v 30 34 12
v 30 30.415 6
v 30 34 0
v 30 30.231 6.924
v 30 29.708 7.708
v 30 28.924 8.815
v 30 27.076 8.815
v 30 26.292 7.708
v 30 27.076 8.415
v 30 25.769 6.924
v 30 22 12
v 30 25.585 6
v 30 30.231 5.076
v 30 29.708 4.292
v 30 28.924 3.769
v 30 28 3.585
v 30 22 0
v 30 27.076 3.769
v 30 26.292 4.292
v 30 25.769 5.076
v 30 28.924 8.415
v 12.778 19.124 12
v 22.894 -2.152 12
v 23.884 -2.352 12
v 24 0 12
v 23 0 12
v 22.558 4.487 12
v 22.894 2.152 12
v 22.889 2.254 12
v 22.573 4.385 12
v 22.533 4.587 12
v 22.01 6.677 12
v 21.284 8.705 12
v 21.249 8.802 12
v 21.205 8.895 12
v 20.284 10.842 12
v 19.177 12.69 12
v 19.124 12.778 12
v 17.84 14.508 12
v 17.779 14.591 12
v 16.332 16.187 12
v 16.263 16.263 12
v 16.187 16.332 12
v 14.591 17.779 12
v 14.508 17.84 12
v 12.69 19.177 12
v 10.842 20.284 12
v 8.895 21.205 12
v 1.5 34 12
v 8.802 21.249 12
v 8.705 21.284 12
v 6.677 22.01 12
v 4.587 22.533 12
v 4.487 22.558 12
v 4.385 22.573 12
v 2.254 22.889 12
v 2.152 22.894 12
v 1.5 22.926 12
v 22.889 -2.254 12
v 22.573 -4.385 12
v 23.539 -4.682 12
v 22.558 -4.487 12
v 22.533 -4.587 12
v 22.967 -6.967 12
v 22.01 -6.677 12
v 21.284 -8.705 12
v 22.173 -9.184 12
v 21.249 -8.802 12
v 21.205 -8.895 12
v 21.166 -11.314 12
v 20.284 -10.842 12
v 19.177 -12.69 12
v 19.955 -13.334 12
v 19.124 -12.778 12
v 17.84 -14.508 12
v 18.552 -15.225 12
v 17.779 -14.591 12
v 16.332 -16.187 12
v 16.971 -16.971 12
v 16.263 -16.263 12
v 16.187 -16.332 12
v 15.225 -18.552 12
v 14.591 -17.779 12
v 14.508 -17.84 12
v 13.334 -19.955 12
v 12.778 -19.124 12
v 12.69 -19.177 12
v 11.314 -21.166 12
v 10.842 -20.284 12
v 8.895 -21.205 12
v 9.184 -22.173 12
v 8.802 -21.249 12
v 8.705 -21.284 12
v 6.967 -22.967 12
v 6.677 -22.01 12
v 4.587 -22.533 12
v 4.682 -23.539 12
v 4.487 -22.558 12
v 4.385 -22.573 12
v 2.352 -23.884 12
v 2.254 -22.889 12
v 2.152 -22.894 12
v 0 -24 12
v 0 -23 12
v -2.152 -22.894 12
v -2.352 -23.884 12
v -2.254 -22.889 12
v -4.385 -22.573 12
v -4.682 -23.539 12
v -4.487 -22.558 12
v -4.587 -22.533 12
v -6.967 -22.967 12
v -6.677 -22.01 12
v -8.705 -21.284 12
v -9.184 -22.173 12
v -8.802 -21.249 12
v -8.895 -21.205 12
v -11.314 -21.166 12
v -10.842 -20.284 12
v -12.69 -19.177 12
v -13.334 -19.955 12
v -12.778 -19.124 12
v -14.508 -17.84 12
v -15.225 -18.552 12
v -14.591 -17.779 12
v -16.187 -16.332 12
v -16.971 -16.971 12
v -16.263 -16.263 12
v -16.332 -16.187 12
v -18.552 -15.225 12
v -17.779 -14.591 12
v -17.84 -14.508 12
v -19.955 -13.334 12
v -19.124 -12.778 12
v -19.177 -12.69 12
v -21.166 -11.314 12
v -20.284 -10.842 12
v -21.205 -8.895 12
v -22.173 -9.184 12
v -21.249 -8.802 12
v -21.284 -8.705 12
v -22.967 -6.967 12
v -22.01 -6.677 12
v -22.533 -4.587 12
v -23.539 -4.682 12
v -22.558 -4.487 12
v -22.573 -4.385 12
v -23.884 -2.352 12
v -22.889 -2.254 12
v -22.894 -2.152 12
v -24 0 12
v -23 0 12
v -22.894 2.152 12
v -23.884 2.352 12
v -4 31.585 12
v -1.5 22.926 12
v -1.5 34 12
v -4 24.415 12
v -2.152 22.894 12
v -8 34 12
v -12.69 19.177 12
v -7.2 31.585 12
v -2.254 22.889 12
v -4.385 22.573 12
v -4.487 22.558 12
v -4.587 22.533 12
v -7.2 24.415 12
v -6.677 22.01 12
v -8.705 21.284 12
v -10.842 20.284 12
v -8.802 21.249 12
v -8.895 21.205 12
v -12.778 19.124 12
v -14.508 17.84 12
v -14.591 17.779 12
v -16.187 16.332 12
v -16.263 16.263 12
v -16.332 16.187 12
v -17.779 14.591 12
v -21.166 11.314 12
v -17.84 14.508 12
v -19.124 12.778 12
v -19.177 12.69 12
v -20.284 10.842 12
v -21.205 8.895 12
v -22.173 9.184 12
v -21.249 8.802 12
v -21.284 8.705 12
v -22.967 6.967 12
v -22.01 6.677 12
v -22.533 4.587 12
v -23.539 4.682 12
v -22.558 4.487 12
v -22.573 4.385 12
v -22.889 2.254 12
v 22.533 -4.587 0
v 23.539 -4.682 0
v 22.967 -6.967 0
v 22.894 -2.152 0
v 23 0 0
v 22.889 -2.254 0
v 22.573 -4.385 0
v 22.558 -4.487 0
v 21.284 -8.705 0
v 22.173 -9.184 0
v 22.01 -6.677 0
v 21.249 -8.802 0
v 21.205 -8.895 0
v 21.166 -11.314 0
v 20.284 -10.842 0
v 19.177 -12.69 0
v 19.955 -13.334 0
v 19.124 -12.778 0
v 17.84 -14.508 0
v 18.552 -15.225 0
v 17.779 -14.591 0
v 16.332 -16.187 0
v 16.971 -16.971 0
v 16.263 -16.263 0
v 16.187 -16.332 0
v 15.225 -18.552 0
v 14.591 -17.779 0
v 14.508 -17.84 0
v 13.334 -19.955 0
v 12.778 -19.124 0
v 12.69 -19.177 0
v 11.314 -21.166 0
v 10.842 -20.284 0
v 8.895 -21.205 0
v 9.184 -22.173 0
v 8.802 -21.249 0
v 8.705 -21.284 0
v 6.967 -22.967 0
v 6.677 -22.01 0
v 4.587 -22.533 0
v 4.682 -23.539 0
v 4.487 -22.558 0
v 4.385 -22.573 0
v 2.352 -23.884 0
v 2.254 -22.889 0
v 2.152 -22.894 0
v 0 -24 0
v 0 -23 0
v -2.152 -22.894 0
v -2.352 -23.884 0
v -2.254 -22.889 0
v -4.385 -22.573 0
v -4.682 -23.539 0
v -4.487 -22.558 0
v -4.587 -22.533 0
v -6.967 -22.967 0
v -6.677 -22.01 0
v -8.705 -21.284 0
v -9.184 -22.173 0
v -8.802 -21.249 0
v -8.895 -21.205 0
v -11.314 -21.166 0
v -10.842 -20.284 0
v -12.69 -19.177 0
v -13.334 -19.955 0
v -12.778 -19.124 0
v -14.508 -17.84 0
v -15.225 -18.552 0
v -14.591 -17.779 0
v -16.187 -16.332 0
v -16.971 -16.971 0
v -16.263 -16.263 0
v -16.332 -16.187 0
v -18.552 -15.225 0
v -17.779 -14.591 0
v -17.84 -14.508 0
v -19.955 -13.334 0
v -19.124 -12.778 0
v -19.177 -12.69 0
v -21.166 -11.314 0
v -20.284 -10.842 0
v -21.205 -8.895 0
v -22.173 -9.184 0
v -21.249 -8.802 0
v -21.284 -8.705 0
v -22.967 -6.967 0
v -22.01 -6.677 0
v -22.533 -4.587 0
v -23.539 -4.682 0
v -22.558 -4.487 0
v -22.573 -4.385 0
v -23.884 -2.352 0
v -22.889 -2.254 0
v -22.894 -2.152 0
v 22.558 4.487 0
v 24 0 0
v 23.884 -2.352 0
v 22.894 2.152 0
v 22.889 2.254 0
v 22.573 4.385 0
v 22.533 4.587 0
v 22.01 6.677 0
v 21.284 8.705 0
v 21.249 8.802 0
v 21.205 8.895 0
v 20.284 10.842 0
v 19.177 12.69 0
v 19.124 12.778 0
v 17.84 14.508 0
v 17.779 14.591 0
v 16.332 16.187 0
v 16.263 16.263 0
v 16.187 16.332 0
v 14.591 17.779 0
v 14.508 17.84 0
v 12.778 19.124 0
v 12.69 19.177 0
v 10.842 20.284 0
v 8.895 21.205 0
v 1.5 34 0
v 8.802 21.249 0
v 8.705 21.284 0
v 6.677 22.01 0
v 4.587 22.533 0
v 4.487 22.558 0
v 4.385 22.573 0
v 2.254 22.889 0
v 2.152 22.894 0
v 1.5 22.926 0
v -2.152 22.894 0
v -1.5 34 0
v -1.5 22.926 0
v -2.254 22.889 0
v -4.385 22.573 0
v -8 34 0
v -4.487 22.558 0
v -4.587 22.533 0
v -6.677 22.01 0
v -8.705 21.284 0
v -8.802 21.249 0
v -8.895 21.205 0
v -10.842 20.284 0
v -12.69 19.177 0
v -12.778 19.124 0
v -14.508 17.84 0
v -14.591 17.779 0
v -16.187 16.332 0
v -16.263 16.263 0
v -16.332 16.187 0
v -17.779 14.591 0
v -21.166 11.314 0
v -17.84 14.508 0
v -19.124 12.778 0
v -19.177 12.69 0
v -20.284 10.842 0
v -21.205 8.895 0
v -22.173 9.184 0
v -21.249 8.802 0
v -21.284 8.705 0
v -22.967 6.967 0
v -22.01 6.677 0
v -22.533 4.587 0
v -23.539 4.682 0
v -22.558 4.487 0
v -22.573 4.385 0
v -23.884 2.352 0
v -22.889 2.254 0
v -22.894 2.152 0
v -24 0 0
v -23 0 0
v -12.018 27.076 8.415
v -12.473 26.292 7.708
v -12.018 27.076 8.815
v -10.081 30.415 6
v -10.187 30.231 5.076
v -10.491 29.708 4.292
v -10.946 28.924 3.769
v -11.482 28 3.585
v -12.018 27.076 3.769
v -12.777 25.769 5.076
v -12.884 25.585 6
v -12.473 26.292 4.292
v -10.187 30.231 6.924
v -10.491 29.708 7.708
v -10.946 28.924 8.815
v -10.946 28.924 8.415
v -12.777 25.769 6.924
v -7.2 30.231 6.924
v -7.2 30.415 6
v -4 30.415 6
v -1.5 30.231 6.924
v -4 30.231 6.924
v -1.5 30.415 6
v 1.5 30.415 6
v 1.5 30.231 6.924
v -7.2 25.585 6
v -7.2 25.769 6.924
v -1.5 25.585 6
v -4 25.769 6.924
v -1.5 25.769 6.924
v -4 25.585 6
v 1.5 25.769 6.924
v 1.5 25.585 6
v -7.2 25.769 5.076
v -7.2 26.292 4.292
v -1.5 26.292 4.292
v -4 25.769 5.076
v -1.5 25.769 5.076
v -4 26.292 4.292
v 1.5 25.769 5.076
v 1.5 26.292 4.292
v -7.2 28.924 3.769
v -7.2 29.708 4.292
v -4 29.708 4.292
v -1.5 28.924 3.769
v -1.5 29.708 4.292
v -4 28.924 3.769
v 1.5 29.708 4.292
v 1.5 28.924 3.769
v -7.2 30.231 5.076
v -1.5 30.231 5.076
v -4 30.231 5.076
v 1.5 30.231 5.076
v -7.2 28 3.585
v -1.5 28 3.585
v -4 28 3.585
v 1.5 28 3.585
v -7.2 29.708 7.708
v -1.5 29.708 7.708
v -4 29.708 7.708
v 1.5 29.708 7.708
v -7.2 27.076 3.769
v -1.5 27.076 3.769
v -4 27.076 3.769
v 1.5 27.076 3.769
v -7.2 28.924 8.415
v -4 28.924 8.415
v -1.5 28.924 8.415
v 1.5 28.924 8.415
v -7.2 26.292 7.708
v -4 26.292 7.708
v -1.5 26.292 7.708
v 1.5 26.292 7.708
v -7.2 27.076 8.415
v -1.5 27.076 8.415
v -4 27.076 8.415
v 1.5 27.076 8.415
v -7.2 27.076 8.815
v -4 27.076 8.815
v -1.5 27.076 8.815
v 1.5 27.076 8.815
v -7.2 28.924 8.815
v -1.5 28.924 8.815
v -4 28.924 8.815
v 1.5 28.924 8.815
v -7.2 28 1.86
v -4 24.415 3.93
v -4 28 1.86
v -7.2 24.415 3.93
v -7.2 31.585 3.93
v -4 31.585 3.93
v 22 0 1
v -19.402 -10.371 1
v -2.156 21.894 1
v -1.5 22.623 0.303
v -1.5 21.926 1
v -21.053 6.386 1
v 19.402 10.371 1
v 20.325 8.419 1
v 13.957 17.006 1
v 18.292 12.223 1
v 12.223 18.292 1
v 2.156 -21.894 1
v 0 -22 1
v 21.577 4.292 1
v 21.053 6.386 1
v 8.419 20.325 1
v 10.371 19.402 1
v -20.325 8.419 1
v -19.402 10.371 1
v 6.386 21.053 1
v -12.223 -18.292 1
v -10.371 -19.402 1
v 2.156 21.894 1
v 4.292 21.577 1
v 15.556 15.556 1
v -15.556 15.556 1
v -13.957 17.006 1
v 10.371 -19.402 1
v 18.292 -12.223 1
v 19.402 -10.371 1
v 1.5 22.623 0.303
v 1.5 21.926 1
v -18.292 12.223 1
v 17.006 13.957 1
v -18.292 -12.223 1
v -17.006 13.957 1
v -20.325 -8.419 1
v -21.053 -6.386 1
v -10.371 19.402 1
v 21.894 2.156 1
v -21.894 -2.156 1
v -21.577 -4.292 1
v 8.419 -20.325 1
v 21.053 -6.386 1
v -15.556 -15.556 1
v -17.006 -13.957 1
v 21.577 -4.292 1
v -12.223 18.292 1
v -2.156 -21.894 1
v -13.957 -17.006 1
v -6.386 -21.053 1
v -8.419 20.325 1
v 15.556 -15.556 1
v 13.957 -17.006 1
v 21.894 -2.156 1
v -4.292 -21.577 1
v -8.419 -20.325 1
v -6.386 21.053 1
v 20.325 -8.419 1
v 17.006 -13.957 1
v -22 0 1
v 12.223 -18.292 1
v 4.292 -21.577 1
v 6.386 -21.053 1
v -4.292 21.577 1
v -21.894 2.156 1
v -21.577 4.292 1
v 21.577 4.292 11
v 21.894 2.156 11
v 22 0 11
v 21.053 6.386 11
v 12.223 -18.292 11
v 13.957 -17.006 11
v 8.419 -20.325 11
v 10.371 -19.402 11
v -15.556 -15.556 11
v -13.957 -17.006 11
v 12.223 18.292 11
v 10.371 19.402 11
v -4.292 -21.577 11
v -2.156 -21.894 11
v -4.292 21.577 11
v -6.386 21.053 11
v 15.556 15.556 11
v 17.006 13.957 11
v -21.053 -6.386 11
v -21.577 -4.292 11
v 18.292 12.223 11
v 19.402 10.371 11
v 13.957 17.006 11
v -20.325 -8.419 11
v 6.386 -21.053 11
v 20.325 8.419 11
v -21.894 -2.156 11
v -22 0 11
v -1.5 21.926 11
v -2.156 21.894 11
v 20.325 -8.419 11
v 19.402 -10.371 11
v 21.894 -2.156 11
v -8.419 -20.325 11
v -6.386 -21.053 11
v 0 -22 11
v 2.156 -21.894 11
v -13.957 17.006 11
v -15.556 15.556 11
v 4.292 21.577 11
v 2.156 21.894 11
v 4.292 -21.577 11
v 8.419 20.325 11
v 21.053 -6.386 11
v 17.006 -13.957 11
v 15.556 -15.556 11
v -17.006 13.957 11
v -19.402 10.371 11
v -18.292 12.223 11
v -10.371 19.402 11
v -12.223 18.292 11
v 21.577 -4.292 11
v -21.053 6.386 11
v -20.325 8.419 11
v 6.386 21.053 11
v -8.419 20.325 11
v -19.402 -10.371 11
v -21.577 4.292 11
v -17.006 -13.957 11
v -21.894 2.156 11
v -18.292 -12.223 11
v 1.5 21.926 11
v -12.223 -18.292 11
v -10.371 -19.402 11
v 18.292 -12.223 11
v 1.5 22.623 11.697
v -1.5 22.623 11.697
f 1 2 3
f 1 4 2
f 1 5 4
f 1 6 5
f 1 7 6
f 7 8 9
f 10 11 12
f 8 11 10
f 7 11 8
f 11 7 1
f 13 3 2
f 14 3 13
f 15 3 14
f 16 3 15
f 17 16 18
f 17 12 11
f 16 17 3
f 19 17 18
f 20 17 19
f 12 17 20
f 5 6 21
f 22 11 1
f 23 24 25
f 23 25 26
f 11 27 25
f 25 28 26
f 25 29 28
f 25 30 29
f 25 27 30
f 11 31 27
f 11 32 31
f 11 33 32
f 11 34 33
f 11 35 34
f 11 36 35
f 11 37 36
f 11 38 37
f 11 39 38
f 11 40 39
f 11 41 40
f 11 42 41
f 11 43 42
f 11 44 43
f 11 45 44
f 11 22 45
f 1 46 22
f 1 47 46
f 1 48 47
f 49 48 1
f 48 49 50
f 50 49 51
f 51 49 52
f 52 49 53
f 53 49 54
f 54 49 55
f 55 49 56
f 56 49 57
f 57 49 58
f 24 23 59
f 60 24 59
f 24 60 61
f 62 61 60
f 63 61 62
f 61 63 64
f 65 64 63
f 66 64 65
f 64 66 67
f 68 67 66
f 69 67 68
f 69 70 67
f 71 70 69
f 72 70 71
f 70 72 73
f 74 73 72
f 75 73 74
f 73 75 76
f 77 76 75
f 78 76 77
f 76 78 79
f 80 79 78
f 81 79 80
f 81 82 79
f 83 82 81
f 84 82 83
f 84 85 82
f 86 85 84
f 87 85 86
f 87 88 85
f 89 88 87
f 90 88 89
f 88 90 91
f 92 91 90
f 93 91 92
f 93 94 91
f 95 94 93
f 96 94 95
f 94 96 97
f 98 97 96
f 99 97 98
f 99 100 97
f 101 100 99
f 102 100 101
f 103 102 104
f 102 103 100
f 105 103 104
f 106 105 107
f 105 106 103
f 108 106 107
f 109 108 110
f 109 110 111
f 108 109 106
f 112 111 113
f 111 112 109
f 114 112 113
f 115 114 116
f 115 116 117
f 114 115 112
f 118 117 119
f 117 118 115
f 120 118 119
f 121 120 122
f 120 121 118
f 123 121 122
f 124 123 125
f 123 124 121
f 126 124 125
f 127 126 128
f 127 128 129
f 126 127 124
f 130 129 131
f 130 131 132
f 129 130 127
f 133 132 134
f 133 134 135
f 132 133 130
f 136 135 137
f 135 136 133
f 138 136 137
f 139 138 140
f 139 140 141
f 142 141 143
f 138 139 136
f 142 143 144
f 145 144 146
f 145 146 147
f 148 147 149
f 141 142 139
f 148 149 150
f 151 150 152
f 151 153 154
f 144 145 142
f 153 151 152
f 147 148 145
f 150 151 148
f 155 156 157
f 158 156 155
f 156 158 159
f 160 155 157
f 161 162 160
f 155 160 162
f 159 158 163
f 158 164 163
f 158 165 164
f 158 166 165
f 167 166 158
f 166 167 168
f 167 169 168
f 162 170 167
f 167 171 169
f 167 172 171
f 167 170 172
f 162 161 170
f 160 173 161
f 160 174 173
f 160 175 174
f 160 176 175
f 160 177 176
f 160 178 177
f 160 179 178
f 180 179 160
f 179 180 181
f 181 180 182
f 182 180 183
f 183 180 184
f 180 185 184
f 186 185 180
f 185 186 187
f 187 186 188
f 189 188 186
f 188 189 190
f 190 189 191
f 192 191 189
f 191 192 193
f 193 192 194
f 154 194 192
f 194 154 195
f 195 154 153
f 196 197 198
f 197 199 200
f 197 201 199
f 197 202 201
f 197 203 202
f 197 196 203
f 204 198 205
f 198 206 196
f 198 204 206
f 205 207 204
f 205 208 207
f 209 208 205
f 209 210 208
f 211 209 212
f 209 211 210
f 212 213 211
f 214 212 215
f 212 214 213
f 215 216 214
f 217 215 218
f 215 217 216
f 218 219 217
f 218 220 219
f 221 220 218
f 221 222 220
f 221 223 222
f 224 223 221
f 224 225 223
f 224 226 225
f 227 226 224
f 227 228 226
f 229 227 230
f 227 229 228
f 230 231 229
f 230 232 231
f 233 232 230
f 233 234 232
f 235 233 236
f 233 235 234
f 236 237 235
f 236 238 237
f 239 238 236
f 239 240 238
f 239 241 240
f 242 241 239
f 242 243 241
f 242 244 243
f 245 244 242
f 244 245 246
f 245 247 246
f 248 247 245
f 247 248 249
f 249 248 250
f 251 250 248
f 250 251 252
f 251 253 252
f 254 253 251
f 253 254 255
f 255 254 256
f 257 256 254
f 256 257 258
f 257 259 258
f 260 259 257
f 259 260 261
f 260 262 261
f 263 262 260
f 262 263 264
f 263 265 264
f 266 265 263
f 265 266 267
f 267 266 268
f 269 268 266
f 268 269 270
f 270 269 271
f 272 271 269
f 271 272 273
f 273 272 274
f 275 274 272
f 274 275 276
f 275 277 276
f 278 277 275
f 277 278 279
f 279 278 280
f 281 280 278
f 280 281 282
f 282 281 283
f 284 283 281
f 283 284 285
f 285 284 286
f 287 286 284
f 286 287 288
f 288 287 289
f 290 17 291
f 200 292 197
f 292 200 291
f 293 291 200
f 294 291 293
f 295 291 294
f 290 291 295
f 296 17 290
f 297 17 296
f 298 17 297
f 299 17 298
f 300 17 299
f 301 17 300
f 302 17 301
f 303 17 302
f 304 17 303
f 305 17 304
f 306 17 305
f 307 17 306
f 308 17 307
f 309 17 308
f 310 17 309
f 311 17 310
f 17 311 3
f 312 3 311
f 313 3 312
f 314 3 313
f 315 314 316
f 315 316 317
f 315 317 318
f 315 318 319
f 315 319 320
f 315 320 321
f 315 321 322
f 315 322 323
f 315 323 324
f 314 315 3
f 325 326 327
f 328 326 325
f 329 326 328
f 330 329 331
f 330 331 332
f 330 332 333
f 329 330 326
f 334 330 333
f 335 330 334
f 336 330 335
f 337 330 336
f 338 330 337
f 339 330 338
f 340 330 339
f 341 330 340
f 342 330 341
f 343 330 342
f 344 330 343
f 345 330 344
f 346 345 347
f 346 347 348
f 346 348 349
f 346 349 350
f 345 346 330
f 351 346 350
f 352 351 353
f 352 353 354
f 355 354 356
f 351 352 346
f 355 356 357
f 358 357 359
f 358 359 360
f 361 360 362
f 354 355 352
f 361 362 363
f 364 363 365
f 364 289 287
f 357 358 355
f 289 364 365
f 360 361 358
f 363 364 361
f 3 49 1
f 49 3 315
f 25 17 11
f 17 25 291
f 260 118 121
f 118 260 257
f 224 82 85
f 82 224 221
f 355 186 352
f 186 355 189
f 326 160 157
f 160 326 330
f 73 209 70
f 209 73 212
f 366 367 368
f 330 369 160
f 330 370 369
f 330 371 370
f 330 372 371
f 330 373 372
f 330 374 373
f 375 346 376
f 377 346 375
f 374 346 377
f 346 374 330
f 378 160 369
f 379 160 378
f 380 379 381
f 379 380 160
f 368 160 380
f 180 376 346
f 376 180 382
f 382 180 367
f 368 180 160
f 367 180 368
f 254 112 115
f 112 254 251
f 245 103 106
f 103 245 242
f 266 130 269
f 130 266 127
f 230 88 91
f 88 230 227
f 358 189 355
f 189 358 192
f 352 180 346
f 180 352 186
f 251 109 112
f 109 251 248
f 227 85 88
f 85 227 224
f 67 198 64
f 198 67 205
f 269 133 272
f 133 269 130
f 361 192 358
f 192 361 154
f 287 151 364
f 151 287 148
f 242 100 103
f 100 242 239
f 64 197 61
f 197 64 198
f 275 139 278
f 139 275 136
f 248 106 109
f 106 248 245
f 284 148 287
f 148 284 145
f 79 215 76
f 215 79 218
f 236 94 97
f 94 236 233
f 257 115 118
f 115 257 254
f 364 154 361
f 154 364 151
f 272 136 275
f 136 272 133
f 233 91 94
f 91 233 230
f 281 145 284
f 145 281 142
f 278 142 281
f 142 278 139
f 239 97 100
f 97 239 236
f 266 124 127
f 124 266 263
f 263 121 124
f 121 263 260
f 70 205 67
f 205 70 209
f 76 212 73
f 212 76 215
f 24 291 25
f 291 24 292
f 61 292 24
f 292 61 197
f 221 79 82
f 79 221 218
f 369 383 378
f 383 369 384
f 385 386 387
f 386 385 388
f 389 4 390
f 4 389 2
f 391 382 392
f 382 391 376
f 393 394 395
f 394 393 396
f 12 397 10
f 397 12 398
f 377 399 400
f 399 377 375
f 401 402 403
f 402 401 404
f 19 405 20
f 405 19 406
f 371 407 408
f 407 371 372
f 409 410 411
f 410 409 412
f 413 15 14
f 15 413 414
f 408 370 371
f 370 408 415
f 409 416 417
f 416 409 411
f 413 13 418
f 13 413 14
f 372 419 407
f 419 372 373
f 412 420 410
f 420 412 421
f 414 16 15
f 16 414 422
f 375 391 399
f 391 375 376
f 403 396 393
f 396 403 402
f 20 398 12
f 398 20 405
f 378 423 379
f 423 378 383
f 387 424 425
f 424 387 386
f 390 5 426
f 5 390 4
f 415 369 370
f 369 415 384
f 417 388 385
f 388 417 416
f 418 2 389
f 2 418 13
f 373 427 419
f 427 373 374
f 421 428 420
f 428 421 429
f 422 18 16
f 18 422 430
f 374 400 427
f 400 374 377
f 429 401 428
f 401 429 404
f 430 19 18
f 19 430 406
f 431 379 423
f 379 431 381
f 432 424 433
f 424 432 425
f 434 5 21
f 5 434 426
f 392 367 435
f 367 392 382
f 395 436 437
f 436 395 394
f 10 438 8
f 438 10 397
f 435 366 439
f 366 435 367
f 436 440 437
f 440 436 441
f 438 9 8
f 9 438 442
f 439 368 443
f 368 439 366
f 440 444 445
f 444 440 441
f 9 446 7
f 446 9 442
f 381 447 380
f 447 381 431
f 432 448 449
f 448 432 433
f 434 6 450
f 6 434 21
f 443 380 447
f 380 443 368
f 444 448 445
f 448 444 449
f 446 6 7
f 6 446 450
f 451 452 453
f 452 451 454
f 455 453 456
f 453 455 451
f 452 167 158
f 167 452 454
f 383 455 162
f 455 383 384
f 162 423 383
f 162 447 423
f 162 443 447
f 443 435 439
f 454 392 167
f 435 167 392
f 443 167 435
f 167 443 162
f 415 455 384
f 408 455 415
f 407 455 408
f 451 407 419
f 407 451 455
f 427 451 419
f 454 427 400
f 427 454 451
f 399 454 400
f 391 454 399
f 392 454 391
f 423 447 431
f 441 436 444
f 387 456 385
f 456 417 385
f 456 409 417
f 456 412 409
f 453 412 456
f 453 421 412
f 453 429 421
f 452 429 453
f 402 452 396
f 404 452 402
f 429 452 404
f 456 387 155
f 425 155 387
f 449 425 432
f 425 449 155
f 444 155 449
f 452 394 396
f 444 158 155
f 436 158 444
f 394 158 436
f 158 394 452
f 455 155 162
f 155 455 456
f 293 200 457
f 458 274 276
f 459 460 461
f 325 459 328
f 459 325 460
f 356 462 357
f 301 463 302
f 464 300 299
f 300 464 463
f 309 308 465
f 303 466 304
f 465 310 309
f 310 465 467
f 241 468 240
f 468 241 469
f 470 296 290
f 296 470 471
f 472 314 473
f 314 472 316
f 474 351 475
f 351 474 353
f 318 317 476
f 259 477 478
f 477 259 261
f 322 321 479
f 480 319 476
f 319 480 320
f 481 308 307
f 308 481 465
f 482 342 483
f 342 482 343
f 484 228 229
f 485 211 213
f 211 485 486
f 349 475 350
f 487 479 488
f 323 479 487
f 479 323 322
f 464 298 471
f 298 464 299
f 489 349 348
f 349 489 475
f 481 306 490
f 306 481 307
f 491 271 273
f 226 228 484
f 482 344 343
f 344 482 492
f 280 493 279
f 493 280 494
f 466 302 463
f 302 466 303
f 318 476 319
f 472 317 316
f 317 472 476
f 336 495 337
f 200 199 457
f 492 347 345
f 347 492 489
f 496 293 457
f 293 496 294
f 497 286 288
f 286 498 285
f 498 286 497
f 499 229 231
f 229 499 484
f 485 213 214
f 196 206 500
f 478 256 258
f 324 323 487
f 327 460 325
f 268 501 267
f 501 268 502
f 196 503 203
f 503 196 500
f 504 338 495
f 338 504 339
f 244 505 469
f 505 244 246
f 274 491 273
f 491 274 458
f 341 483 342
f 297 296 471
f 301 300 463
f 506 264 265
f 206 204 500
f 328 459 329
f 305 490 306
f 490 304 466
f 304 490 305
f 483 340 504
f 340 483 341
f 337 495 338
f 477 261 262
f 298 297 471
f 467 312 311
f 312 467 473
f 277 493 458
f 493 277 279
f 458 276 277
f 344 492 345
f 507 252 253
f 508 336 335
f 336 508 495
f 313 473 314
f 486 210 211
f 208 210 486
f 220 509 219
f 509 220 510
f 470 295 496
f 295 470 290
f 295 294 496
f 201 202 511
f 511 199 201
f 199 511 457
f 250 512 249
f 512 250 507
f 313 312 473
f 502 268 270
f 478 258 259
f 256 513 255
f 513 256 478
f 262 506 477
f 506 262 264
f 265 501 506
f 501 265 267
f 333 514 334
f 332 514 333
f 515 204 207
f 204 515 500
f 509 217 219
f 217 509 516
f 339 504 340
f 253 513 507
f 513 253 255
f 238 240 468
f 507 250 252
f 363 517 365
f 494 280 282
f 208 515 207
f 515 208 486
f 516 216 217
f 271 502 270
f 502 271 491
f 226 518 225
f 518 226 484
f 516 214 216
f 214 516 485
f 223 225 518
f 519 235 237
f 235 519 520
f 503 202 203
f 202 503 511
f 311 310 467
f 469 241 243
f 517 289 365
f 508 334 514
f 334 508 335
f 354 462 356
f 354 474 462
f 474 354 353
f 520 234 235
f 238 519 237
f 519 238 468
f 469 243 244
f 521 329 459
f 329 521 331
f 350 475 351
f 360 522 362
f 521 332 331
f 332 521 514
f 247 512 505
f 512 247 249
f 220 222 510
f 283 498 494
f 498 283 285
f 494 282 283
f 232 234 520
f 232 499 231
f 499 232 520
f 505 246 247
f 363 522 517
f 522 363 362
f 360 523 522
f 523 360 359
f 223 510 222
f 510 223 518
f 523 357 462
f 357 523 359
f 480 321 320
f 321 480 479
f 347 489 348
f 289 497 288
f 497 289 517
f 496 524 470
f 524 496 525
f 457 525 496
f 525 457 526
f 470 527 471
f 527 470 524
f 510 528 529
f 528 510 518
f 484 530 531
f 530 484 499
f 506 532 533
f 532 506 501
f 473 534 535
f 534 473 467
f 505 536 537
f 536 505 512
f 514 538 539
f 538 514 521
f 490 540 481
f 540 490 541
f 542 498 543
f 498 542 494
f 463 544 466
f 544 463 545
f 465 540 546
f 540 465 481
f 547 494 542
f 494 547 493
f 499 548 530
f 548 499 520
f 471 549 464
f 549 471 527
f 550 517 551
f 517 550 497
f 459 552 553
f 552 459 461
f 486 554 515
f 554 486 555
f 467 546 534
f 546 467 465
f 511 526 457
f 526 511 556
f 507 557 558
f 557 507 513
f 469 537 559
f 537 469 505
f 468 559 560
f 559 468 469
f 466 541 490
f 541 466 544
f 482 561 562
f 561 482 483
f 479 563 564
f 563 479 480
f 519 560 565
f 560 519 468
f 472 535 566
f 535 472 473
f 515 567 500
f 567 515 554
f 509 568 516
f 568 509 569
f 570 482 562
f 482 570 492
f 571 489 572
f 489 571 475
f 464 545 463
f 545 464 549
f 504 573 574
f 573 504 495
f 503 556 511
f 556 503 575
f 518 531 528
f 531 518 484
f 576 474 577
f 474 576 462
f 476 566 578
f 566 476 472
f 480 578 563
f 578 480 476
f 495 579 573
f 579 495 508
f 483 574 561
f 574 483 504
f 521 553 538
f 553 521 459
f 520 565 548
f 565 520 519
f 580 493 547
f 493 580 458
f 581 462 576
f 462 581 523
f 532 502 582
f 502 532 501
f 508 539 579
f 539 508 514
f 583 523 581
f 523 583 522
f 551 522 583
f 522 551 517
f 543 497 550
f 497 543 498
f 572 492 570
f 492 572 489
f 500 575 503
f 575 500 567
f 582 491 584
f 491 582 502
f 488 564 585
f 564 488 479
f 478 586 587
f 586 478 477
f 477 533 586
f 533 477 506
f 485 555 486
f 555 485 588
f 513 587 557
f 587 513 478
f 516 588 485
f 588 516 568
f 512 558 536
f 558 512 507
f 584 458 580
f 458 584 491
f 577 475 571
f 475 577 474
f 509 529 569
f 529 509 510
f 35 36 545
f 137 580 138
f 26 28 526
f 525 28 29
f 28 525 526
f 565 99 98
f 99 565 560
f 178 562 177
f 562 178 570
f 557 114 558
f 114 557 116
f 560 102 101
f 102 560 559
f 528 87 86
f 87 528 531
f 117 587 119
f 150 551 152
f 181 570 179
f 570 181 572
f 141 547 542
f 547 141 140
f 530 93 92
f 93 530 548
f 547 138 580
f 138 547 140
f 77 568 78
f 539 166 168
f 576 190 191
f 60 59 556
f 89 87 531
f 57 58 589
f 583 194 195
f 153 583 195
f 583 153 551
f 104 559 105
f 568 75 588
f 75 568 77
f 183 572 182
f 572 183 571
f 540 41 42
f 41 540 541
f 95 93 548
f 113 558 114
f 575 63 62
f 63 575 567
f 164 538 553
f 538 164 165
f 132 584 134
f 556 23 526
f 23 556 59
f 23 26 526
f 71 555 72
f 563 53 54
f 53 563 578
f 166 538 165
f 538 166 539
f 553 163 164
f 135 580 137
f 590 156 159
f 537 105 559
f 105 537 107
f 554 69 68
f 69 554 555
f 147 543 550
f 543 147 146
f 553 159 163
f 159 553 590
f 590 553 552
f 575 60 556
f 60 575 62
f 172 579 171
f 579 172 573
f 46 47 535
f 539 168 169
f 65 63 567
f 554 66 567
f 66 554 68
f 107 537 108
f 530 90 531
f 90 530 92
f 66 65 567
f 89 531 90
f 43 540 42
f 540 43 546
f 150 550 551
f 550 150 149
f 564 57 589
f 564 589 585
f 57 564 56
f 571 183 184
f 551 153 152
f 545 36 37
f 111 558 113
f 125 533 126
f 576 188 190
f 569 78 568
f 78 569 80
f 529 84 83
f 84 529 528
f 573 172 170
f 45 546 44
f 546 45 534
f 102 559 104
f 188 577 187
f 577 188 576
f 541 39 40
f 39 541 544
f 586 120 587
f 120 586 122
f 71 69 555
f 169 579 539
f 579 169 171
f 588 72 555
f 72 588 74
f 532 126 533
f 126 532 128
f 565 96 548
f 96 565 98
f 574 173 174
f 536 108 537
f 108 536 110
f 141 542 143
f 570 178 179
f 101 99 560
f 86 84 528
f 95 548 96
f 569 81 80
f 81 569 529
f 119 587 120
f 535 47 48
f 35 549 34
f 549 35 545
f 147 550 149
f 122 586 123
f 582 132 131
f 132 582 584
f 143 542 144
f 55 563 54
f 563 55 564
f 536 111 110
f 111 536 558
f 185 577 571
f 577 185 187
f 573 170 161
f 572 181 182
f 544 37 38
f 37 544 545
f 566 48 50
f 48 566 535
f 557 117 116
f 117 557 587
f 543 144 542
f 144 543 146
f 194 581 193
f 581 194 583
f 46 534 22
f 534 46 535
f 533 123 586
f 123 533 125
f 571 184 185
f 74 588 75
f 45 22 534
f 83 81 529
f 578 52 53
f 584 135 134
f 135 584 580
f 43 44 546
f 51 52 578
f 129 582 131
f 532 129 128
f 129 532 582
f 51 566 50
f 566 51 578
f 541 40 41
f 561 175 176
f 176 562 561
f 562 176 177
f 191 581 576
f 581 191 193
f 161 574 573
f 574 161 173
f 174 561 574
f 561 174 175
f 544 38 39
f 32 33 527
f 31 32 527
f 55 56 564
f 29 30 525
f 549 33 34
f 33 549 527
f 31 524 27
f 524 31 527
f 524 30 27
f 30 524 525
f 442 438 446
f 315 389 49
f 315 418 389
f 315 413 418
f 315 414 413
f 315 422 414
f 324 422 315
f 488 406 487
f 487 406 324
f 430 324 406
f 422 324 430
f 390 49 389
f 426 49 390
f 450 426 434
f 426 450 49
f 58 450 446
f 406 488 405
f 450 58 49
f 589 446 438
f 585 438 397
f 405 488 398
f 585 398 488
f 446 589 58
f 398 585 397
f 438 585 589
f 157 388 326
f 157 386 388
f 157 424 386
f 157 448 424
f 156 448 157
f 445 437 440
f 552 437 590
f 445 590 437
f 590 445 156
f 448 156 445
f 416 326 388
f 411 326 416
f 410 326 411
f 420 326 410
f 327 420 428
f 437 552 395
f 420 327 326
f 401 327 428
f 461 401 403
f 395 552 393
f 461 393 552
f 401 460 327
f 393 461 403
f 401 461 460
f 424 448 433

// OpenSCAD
// file: ../standard_optomechanics/cylinder_clamp.scad
use <../utilities.scad>;
d=0.05;

//for 1 inch/25mm post clamp, an inner radius of 12.8 is good.
	
module cylinder_clamp(
	inner_r=12.8, //radius of the cylinder being clamped (ish!)
	clamp_h=11, //thicknedess of the clamp along the cylinder axis
	clamp_t=4, //thickness of the clamp radially
	flat_t=8, //how thick the bottom of the clamp is (often need to allow for the mounting bolt head here)
	flat_width=15, //width of the flat base
	mounting_bolt=4, //nominal size of mounting bolt (default is 4 for M4, 0 to disable)
	nut_trap=false,
	bevel_top=0.5, //size of 45 degree bevel on top surface
	bevel_bottom=0.8 //size of 45 degree bevel on bottom of hole
	){
	assign(
		post_r = inner_r, //poor initial choice of name!
		bolt_flat_w=10, //width of the region where the bolt is
		gap_w=3 //size of the gap that is squeezed by the bolt
	)
	difference(){
		hull(){
			cylinder(h=clamp_h,r=post_r+clamp_t,center=true,$fn=48);
			translate([0,-post_r-flat_t/2,0]) cube([flat_width,flat_t,clamp_h],center=true);
			translate([0,post_r+bolt_flat_w/2,0]) cube([12,bolt_flat_w,clamp_h],center=true);
		}
	
		cylinder(h=9999,r=post_r,center=true,$fn=48); //cylinder being clamped
		//bevels, top and bottom
		translate([0,0,-clamp_h/2]) cylinder(r1=post_r+3*bevel_bottom,r2=post_r-bevel_bottom,h=4*bevel_bottom,center=true);
		translate([0,0,clamp_h/2]) cylinder(r2=post_r+3*bevel_top,r1=post_r-bevel_top,h=4*bevel_top,center=true);
		//gap (squeezed by bolt)
		translate([0,999,0]) cube([gap_w,999*2,999],center=true); //gap
	
		//clamping bolt
		translate([gap_w/2+2,post_r+bolt_flat_w/2,0]) rotate([0,0,-90]) nut_y(4,h=999,shaft=true);
		translate([-gap_w/2-2,post_r+bolt_flat_w/2,0]) rotate([0,0,90]) cylinder_with_45deg_top(r=4,h=999,$fn=16); //counterbore for nut head
	
		if(mounting_bolt > 0){
			//mounting bolt
			translate([0,-post_r-4.5,0]) rotate([-90,0,0]){
				intersection(){
					rotate([90,0,0])
						if(nut_trap){
							nut_y(mounting_bolt,fudge=1.15,shaft=true,h=999);
						}else{
							screw_y(mounting_bolt,fudge=1.07,shaft=true,h=999);
						}
					cube([inner_r*2,inner_r*2,clamp_h*2],center=true);
				}
			}
		}
		//in the case of thick clamps with thin flats, this keeps the bottom flat
		translate([0,-inner_r-flat_t-999,0]) cube([9999,999*2,9999],center=true);
	}
}

module cylinder_clamp_v(
	inner_r=12.8, //radius of the cylinder being clamped (ish!)
	clamp_h=10, //width of the clamp along the cylinder (y) axis
	clamp_t=4, //thickness of the clamp radially
	flat_t=8, //how thick the bottom of the clamp is (often need to allow for the mounting bolt head here)
	flat_width=15, //width of the flat base
	mounting_bolt=4, //nominal size of mounting bolt (default is 4 for M4, 0 to disable)
	bevel=0.5 //put a 45 degree bevel on the edges of the hole
	){
	assign(
		post_r = inner_r, //poor initial choice of name!
		bolt_flat_w=11, //width of the region where the bolt is
		gap_w=2*inner_r*sin(45/2),//sin(acos(1-(9/2-4/2*1.22)/inner_r))*inner_r //size of the gap that is squeezed by the bolt
		bolt_z = inner_r+4/2*1.22+d //position of bolt (so bolt just clears the cylinder we're clamping
	)assign( //the second assign statement allows us to use gap_w
		bolt_span=gap_w+4+d//max(2*inner_r*sin(acos(1-(9/2-4/2*1.22)/inner_r)), gap_w+4)
	)
	difference(){
		hull(){
			rotate([90,0,0]) cylinder(h=clamp_h,r=inner_r+clamp_t,center=true,$fn=48);
			translate([0,0,-inner_r-flat_t/2]) cube([flat_width,clamp_h,flat_t],center=true);
			translate([0,0,bolt_z]) cube([gap_w+9,clamp_h,bolt_flat_w],center=true);
		}
	
		cylinder_with_45deg_top(h=9999,r=post_r,center=true,$fn=48); //cylinder being clamped
		reflect([0,1,0]) translate([0,clamp_h/2,0]) rotate([90,0,0]) cylinder(r1=post_r+3*bevel,r2=post_r-bevel,h=4*bevel,center=true); //bevel
		translate([0,0,999]) cube([gap_w,999,999*2],center=true); //gap
	
		//clamping bolt
		translate([bolt_span/2,0,bolt_z]) rotate([0,0,-90]) nut_y(4,h=999,shaft=true);
		translate([-bolt_span/2,0,bolt_z]) rotate([0,0,90]) cylinder_with_45deg_top(r=4,h=999,$fn=16); //counterbore for nut head
	
		if(mounting_bolt > 0){
			//mounting bolt
			translate([0,0,-post_r-4.5]){
				cylinder(r=mounting_bolt*1.1,h=post_r,$fn=16);
				cylinder(r=mounting_bolt/2*1.22,h=flat_t*2,center=true,$fn=16);
			}
		}
		translate([0,0,-inner_r-flat_t-999]) cube([9999,9999,999*2],center=true);
	}
}

translate([0,30,0]) cylinder_clamp_v(30.5/2, 10, flat_width=24, mounting_bolt=4, flat_t=8);

cylinder_clamp(30.5/2, flat_width=24, mounting_bolt=4, flat_t=8,nut_trap=true);
// main file
use <../standard_optomechanics/cylinder_clamp.scad>;
use <../utilities.scad>;

t = 2;
h = 12;
inner_r = 22;
nut_flat = 12;
mount_x = inner_r+8;
d=0.05;
$fn=64;


difference(){
    union(){
        hull(){
            cylinder(r=inner_r+t,h=h);
            translate([-8,inner_r,0]) cube([6.5,nut_flat,h]);
        }
        intersection(){
            cube([mount_x,inner_r+nut_flat,h]);
            hull(){
                translate([0,inner_r,0]) cube([mount_x,nut_flat,h]);
                cube([inner_r+t,d,h]);
            }
        }
    }
    
    //gap for pinch
    translate([0,inner_r,0]) cube([3,inner_r*2,999],center=true);
    
    //screw and nut
    translate([-4,inner_r+nut_flat/2,h/2]) rotate(90) nut_y(4,shaft=true,top_access=true, extra_height=0.4);
    
    //tube
    chamfered_hole(r=inner_r,h=h);
    
    
}
